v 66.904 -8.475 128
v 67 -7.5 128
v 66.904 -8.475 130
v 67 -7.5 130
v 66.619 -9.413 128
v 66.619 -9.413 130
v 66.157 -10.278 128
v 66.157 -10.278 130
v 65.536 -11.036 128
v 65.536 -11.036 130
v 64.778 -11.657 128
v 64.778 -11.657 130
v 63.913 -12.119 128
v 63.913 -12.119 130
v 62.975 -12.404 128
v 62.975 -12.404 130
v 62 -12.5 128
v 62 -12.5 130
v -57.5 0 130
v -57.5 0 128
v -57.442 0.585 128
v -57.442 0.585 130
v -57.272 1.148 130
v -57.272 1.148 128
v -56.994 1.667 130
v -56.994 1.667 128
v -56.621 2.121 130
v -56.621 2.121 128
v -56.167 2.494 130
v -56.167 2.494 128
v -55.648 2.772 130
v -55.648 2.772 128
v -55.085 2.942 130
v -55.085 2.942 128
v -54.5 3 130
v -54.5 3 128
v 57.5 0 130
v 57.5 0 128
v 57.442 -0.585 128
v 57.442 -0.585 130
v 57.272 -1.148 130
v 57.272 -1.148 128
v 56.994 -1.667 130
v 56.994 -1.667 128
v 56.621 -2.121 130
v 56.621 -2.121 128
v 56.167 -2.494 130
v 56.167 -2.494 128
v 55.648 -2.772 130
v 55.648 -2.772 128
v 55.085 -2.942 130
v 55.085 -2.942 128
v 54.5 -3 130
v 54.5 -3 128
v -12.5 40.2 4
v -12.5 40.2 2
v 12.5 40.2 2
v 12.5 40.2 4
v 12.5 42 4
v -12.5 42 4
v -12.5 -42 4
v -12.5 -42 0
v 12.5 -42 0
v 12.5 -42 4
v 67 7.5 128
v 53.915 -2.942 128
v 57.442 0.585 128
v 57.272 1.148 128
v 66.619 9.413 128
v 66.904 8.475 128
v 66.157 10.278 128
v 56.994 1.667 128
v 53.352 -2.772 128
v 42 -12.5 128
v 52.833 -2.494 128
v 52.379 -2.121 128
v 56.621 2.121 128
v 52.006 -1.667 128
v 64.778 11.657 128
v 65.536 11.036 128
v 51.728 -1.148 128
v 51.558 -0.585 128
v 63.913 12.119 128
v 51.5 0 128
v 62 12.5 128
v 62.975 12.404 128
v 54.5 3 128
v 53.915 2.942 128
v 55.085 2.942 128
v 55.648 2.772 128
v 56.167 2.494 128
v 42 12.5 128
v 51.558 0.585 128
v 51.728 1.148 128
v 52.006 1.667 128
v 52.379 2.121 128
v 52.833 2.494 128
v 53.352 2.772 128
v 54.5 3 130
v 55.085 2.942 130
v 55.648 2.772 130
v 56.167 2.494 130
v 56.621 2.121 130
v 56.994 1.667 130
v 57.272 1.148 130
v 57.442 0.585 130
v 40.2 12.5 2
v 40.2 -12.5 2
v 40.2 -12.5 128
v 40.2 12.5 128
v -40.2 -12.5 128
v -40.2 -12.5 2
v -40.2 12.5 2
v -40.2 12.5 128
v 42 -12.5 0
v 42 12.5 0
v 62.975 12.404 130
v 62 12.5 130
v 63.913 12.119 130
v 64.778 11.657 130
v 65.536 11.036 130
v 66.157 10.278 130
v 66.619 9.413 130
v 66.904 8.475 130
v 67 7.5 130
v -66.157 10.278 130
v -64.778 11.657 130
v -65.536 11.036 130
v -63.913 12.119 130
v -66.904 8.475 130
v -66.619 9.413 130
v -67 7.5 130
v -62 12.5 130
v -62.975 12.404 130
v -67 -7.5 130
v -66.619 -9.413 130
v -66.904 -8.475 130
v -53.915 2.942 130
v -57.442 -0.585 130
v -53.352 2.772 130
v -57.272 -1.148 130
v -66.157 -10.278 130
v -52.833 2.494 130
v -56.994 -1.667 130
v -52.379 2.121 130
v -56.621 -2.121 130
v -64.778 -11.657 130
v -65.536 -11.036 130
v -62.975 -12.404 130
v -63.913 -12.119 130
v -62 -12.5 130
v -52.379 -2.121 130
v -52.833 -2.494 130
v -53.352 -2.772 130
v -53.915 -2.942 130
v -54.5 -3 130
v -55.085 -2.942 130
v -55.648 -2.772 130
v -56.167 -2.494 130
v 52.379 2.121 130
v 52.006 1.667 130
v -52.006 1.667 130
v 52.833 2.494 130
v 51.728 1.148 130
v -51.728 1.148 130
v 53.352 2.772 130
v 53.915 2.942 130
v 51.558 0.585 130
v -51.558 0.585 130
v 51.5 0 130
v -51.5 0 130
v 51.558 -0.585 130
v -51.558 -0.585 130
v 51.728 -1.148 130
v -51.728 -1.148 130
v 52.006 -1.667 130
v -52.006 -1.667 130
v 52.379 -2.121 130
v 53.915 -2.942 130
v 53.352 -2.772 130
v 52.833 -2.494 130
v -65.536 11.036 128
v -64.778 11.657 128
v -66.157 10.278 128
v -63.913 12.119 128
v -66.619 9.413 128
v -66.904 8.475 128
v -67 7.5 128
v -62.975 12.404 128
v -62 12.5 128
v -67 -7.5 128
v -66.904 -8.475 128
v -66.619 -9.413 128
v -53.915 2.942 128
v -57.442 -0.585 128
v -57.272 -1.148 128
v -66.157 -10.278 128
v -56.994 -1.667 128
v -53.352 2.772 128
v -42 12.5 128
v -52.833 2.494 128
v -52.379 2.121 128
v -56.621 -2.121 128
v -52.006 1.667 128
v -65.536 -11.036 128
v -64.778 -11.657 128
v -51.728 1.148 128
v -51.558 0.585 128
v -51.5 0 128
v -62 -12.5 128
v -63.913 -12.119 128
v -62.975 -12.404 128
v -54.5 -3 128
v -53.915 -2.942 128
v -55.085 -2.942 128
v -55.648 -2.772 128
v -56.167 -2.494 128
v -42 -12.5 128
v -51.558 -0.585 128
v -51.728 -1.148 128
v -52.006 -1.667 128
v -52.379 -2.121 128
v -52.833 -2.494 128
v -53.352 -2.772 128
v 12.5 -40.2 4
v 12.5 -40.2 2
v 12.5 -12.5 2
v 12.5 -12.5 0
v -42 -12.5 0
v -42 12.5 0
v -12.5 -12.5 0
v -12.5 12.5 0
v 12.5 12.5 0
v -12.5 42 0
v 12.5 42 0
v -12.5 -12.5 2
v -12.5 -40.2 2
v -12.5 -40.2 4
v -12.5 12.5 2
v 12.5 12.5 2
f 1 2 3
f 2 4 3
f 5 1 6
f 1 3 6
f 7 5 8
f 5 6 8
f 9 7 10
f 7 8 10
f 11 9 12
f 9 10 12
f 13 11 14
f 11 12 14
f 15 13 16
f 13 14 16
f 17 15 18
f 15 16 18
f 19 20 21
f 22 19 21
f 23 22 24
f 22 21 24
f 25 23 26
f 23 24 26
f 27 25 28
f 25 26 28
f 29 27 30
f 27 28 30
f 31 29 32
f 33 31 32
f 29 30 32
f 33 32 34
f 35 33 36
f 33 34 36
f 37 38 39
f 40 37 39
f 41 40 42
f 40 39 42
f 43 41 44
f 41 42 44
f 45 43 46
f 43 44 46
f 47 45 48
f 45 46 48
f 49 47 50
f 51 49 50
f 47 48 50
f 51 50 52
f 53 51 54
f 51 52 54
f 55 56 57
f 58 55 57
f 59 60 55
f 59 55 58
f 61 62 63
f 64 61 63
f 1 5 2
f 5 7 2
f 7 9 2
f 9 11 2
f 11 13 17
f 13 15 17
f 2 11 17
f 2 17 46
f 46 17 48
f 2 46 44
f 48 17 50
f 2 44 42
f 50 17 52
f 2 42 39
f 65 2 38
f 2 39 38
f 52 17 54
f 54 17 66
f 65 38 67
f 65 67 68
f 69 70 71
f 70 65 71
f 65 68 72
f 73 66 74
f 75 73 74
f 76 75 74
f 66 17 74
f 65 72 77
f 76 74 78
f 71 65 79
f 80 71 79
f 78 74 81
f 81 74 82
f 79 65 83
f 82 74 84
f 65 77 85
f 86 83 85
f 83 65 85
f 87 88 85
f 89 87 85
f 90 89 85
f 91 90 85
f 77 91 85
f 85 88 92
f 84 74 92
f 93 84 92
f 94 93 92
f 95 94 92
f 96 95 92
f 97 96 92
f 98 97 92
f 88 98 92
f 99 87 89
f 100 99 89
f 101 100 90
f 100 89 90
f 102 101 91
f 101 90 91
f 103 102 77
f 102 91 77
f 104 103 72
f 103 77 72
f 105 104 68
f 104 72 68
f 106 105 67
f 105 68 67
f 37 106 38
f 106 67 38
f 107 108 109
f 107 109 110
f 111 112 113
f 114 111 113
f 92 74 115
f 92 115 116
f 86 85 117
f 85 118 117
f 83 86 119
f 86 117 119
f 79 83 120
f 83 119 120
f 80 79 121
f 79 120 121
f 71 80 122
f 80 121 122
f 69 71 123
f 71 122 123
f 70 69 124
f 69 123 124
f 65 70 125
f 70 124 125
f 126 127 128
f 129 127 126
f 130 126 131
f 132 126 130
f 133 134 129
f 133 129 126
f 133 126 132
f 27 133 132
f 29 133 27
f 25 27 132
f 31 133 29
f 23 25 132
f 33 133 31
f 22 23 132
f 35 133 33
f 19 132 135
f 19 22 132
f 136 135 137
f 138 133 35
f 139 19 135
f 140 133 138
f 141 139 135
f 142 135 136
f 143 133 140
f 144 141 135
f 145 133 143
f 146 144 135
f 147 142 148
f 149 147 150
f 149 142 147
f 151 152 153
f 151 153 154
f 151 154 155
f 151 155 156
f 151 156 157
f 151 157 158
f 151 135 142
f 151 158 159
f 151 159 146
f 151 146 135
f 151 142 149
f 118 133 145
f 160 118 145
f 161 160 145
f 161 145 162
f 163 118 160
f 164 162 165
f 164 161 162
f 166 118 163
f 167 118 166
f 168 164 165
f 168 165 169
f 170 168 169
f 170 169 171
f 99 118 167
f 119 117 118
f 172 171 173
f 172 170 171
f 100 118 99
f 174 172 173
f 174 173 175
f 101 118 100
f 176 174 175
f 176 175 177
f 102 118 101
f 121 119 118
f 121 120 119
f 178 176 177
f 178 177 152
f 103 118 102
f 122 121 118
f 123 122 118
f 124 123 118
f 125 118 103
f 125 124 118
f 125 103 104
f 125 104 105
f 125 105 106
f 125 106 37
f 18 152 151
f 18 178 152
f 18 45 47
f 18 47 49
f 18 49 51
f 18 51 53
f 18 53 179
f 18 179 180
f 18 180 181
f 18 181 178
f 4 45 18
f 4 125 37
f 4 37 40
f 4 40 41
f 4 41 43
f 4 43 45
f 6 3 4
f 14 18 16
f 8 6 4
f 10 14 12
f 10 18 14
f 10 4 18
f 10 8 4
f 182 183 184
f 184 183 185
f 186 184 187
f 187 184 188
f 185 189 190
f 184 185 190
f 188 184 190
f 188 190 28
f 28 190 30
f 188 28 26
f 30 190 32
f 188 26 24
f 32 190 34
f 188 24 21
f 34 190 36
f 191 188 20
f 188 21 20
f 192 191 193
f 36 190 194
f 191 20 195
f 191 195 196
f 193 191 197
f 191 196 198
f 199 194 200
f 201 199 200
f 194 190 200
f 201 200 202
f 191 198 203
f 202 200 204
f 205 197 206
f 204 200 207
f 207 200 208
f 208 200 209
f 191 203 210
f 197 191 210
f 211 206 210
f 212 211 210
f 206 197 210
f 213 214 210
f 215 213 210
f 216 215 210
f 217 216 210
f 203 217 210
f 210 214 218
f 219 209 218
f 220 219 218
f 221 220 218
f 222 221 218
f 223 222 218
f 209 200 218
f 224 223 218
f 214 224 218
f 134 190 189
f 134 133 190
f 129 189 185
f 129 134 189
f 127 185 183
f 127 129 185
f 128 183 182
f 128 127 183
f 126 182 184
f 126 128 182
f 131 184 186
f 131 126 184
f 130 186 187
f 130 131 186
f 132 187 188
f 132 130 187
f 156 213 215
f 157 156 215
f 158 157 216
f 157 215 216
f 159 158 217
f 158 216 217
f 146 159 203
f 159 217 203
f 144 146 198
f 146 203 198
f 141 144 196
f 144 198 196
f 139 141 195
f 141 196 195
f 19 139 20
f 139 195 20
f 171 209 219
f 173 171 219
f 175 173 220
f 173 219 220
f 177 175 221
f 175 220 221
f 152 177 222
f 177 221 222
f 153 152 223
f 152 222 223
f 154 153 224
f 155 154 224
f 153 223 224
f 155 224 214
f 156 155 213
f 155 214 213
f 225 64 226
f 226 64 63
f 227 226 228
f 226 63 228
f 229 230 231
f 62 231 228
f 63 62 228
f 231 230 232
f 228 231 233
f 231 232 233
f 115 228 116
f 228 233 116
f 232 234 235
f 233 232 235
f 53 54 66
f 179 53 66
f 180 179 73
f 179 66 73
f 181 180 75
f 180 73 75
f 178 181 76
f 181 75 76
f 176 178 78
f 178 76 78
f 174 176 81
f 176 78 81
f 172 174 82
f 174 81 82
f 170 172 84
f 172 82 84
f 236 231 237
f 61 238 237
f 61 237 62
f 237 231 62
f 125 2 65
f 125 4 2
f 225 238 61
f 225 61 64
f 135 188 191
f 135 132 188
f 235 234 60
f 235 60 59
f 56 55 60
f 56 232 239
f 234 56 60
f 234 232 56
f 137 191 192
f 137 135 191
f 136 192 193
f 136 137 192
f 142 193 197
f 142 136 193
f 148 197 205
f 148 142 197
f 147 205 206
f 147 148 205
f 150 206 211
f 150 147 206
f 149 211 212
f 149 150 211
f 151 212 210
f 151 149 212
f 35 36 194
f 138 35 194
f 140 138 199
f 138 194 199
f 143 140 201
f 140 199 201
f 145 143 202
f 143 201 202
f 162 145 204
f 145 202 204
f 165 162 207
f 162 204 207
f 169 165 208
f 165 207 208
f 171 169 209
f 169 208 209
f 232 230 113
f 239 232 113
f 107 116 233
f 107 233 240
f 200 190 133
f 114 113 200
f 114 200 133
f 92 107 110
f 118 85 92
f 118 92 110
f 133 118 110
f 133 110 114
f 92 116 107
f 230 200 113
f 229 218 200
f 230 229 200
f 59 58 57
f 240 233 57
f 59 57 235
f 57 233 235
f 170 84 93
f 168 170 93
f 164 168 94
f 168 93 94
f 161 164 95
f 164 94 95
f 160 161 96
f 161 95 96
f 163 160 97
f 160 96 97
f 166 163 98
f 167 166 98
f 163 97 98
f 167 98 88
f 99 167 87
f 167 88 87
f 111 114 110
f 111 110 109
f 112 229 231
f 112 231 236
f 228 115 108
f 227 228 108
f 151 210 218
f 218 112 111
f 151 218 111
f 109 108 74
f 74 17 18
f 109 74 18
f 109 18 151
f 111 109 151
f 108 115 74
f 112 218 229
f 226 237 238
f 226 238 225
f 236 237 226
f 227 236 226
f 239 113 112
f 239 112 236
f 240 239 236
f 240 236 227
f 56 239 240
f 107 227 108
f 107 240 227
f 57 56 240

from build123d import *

# Parameters (mm, degrees)
F0_W      = 25
F0_H      = 27.7
F0_H_2    = 25
F0_W_2    = 27.7
F1_DEPTH  = 2
F0_W_3    = 1.8
F2_DEPTH  = 130
F0_H_3    = 1.8
F3_DEPTH  = 4
F4_W      = 25
F4_H      = 2
F5_DEPTH  = 80.4
F7_W      = 25
F7_H      = 2
F8_DEPTH  = 25
F6_W      = 25
F6_H      = 2
F9_DEPTH  = 25
F12_DEPTH = 25
F13_R     = 5


with BuildPart() as f1:
    # F0 (on Top) → F1 (new body)
    with BuildSketch(Plane.XY):
        with Locations((0, 26.35)):
            Rectangle(F0_W, F0_H)
        Rectangle(F0_W, F0_H_2)
        with Locations((26.35, 0)):
            Rectangle(F0_W_2, F0_H_2)
        with Locations((0, -26.35)):
            Rectangle(F0_W, F0_H)
        with Locations((-26.35, 0)):
            Rectangle(F0_W_2, F0_H_2)
    extrude(amount=F1_DEPTH)

    # F0 (on Top) → F2 (join)
    with BuildSketch(Plane.XY):
        with Locations((-41.1, 0)):
            Rectangle(F0_W_3, F0_H_2)
        with Locations((41.1, 0)):
            Rectangle(F0_W_3, F0_H_2)
    extrude(amount=F2_DEPTH)

    # F0 (on Top) → F3 (join)
    with BuildSketch(Plane.XY):
        with Locations((0, 41.1)):
            Rectangle(F0_W, F0_H_3)
        with Locations((0, -41.1)):
            Rectangle(F0_W, F0_H_3)
    extrude(amount=F3_DEPTH)

    # F4 (on face) → F5 (join)
    with BuildSketch(Plane(origin=(40.2, 0, 0), x_dir=(0, -1, 0), z_dir=(-1, 0, 0))):
        with Locations((0, 129)):
            Rectangle(F4_W, F4_H)
    extrude(amount=F5_DEPTH)

    # F7 (on face) → F8 (join)
    with BuildSketch(Plane.YZ.offset(42)):
        with Locations((0, 129)):
            Rectangle(F7_W, F7_H)
    extrude(amount=F8_DEPTH)

    # F6 (on face) → F9 (join)
    with BuildSketch(Plane(origin=(-42, 0, 0), x_dir=(0, -1, 0), z_dir=(-1, 0, 0))):
        with Locations((0, 129)):
            Rectangle(F6_W, F6_H)
    extrude(amount=F9_DEPTH)

    # F11 (on face) + F10 (on face) → F12 (cut)
    with BuildSketch(Plane(origin=(0, 0, 128), x_dir=(1, 0, 0), z_dir=(0, 0, -1))):
        with BuildLine():
            ThreePointArc((-51.5, 0), (-52.3786796564, 2.1213203436), (-54.5, 3))
            Line((-54.5, 3), (-54.5, 0))
            Line((-54.5, 0), (-51.5, 0))
        make_face()
        with BuildLine():
            Line((-54.5, 0), (-54.5, 3))
            ThreePointArc((-54.5, 3), (-56.6213203436, 2.1213203436), (-57.5, 0))
            Line((-57.5, 0), (-54.5, 0))
        make_face()
        with BuildLine():
            Line((-51.5, 0), (-54.5, 0))
            Line((-54.5, 0), (-54.5, -3))
            ThreePointArc((-54.5, -3), (-52.3786796564, -2.1213203436), (-51.5, 0))
        make_face()
        with BuildLine():
            Line((-54.5, -3), (-54.5, 0))
            Line((-54.5, 0), (-57.5, 0))
            ThreePointArc((-57.5, 0), (-56.6213203436, -2.1213203436), (-54.5, -3))
        make_face()
    with BuildSketch(Plane(origin=(0, 0, 128), x_dir=(1, 0, 0), z_dir=(0, 0, -1))):
        with BuildLine():
            Line((54.5, 0), (54.5, 3))
            ThreePointArc((54.5, 3), (52.3786796564, 2.1213203436), (51.5, 0))
            Line((51.5, 0), (54.5, 0))
        make_face()
        with BuildLine():
            ThreePointArc((57.5, 0), (56.6213203436, 2.1213203436), (54.5, 3))
            Line((54.5, 3), (54.5, 0))
            Line((54.5, 0), (57.5, 0))
        make_face()
        with BuildLine():
            Line((57.5, 0), (54.5, 0))
            Line((54.5, 0), (54.5, -3))
            ThreePointArc((54.5, -3), (56.6213203436, -2.1213203436), (57.5, 0))
        make_face()
        with BuildLine():
            Line((54.5, -3), (54.5, 0))
            Line((54.5, 0), (51.5, 0))
            ThreePointArc((51.5, 0), (52.3786796564, -2.1213203436), (54.5, -3))
        make_face()
    extrude(amount=-F12_DEPTH, mode=Mode.SUBTRACT)

    # F13
    f13_edges = [f1.edges().sort_by_distance(p)[0] for p in [
        (67, 12.5, 129),
        (67, -12.5, 129),
        (-67, 12.5, 129),
        (-67, -12.5, 129),
    ]]
    fillet(f13_edges, radius=F13_R)


solid = f1.part
